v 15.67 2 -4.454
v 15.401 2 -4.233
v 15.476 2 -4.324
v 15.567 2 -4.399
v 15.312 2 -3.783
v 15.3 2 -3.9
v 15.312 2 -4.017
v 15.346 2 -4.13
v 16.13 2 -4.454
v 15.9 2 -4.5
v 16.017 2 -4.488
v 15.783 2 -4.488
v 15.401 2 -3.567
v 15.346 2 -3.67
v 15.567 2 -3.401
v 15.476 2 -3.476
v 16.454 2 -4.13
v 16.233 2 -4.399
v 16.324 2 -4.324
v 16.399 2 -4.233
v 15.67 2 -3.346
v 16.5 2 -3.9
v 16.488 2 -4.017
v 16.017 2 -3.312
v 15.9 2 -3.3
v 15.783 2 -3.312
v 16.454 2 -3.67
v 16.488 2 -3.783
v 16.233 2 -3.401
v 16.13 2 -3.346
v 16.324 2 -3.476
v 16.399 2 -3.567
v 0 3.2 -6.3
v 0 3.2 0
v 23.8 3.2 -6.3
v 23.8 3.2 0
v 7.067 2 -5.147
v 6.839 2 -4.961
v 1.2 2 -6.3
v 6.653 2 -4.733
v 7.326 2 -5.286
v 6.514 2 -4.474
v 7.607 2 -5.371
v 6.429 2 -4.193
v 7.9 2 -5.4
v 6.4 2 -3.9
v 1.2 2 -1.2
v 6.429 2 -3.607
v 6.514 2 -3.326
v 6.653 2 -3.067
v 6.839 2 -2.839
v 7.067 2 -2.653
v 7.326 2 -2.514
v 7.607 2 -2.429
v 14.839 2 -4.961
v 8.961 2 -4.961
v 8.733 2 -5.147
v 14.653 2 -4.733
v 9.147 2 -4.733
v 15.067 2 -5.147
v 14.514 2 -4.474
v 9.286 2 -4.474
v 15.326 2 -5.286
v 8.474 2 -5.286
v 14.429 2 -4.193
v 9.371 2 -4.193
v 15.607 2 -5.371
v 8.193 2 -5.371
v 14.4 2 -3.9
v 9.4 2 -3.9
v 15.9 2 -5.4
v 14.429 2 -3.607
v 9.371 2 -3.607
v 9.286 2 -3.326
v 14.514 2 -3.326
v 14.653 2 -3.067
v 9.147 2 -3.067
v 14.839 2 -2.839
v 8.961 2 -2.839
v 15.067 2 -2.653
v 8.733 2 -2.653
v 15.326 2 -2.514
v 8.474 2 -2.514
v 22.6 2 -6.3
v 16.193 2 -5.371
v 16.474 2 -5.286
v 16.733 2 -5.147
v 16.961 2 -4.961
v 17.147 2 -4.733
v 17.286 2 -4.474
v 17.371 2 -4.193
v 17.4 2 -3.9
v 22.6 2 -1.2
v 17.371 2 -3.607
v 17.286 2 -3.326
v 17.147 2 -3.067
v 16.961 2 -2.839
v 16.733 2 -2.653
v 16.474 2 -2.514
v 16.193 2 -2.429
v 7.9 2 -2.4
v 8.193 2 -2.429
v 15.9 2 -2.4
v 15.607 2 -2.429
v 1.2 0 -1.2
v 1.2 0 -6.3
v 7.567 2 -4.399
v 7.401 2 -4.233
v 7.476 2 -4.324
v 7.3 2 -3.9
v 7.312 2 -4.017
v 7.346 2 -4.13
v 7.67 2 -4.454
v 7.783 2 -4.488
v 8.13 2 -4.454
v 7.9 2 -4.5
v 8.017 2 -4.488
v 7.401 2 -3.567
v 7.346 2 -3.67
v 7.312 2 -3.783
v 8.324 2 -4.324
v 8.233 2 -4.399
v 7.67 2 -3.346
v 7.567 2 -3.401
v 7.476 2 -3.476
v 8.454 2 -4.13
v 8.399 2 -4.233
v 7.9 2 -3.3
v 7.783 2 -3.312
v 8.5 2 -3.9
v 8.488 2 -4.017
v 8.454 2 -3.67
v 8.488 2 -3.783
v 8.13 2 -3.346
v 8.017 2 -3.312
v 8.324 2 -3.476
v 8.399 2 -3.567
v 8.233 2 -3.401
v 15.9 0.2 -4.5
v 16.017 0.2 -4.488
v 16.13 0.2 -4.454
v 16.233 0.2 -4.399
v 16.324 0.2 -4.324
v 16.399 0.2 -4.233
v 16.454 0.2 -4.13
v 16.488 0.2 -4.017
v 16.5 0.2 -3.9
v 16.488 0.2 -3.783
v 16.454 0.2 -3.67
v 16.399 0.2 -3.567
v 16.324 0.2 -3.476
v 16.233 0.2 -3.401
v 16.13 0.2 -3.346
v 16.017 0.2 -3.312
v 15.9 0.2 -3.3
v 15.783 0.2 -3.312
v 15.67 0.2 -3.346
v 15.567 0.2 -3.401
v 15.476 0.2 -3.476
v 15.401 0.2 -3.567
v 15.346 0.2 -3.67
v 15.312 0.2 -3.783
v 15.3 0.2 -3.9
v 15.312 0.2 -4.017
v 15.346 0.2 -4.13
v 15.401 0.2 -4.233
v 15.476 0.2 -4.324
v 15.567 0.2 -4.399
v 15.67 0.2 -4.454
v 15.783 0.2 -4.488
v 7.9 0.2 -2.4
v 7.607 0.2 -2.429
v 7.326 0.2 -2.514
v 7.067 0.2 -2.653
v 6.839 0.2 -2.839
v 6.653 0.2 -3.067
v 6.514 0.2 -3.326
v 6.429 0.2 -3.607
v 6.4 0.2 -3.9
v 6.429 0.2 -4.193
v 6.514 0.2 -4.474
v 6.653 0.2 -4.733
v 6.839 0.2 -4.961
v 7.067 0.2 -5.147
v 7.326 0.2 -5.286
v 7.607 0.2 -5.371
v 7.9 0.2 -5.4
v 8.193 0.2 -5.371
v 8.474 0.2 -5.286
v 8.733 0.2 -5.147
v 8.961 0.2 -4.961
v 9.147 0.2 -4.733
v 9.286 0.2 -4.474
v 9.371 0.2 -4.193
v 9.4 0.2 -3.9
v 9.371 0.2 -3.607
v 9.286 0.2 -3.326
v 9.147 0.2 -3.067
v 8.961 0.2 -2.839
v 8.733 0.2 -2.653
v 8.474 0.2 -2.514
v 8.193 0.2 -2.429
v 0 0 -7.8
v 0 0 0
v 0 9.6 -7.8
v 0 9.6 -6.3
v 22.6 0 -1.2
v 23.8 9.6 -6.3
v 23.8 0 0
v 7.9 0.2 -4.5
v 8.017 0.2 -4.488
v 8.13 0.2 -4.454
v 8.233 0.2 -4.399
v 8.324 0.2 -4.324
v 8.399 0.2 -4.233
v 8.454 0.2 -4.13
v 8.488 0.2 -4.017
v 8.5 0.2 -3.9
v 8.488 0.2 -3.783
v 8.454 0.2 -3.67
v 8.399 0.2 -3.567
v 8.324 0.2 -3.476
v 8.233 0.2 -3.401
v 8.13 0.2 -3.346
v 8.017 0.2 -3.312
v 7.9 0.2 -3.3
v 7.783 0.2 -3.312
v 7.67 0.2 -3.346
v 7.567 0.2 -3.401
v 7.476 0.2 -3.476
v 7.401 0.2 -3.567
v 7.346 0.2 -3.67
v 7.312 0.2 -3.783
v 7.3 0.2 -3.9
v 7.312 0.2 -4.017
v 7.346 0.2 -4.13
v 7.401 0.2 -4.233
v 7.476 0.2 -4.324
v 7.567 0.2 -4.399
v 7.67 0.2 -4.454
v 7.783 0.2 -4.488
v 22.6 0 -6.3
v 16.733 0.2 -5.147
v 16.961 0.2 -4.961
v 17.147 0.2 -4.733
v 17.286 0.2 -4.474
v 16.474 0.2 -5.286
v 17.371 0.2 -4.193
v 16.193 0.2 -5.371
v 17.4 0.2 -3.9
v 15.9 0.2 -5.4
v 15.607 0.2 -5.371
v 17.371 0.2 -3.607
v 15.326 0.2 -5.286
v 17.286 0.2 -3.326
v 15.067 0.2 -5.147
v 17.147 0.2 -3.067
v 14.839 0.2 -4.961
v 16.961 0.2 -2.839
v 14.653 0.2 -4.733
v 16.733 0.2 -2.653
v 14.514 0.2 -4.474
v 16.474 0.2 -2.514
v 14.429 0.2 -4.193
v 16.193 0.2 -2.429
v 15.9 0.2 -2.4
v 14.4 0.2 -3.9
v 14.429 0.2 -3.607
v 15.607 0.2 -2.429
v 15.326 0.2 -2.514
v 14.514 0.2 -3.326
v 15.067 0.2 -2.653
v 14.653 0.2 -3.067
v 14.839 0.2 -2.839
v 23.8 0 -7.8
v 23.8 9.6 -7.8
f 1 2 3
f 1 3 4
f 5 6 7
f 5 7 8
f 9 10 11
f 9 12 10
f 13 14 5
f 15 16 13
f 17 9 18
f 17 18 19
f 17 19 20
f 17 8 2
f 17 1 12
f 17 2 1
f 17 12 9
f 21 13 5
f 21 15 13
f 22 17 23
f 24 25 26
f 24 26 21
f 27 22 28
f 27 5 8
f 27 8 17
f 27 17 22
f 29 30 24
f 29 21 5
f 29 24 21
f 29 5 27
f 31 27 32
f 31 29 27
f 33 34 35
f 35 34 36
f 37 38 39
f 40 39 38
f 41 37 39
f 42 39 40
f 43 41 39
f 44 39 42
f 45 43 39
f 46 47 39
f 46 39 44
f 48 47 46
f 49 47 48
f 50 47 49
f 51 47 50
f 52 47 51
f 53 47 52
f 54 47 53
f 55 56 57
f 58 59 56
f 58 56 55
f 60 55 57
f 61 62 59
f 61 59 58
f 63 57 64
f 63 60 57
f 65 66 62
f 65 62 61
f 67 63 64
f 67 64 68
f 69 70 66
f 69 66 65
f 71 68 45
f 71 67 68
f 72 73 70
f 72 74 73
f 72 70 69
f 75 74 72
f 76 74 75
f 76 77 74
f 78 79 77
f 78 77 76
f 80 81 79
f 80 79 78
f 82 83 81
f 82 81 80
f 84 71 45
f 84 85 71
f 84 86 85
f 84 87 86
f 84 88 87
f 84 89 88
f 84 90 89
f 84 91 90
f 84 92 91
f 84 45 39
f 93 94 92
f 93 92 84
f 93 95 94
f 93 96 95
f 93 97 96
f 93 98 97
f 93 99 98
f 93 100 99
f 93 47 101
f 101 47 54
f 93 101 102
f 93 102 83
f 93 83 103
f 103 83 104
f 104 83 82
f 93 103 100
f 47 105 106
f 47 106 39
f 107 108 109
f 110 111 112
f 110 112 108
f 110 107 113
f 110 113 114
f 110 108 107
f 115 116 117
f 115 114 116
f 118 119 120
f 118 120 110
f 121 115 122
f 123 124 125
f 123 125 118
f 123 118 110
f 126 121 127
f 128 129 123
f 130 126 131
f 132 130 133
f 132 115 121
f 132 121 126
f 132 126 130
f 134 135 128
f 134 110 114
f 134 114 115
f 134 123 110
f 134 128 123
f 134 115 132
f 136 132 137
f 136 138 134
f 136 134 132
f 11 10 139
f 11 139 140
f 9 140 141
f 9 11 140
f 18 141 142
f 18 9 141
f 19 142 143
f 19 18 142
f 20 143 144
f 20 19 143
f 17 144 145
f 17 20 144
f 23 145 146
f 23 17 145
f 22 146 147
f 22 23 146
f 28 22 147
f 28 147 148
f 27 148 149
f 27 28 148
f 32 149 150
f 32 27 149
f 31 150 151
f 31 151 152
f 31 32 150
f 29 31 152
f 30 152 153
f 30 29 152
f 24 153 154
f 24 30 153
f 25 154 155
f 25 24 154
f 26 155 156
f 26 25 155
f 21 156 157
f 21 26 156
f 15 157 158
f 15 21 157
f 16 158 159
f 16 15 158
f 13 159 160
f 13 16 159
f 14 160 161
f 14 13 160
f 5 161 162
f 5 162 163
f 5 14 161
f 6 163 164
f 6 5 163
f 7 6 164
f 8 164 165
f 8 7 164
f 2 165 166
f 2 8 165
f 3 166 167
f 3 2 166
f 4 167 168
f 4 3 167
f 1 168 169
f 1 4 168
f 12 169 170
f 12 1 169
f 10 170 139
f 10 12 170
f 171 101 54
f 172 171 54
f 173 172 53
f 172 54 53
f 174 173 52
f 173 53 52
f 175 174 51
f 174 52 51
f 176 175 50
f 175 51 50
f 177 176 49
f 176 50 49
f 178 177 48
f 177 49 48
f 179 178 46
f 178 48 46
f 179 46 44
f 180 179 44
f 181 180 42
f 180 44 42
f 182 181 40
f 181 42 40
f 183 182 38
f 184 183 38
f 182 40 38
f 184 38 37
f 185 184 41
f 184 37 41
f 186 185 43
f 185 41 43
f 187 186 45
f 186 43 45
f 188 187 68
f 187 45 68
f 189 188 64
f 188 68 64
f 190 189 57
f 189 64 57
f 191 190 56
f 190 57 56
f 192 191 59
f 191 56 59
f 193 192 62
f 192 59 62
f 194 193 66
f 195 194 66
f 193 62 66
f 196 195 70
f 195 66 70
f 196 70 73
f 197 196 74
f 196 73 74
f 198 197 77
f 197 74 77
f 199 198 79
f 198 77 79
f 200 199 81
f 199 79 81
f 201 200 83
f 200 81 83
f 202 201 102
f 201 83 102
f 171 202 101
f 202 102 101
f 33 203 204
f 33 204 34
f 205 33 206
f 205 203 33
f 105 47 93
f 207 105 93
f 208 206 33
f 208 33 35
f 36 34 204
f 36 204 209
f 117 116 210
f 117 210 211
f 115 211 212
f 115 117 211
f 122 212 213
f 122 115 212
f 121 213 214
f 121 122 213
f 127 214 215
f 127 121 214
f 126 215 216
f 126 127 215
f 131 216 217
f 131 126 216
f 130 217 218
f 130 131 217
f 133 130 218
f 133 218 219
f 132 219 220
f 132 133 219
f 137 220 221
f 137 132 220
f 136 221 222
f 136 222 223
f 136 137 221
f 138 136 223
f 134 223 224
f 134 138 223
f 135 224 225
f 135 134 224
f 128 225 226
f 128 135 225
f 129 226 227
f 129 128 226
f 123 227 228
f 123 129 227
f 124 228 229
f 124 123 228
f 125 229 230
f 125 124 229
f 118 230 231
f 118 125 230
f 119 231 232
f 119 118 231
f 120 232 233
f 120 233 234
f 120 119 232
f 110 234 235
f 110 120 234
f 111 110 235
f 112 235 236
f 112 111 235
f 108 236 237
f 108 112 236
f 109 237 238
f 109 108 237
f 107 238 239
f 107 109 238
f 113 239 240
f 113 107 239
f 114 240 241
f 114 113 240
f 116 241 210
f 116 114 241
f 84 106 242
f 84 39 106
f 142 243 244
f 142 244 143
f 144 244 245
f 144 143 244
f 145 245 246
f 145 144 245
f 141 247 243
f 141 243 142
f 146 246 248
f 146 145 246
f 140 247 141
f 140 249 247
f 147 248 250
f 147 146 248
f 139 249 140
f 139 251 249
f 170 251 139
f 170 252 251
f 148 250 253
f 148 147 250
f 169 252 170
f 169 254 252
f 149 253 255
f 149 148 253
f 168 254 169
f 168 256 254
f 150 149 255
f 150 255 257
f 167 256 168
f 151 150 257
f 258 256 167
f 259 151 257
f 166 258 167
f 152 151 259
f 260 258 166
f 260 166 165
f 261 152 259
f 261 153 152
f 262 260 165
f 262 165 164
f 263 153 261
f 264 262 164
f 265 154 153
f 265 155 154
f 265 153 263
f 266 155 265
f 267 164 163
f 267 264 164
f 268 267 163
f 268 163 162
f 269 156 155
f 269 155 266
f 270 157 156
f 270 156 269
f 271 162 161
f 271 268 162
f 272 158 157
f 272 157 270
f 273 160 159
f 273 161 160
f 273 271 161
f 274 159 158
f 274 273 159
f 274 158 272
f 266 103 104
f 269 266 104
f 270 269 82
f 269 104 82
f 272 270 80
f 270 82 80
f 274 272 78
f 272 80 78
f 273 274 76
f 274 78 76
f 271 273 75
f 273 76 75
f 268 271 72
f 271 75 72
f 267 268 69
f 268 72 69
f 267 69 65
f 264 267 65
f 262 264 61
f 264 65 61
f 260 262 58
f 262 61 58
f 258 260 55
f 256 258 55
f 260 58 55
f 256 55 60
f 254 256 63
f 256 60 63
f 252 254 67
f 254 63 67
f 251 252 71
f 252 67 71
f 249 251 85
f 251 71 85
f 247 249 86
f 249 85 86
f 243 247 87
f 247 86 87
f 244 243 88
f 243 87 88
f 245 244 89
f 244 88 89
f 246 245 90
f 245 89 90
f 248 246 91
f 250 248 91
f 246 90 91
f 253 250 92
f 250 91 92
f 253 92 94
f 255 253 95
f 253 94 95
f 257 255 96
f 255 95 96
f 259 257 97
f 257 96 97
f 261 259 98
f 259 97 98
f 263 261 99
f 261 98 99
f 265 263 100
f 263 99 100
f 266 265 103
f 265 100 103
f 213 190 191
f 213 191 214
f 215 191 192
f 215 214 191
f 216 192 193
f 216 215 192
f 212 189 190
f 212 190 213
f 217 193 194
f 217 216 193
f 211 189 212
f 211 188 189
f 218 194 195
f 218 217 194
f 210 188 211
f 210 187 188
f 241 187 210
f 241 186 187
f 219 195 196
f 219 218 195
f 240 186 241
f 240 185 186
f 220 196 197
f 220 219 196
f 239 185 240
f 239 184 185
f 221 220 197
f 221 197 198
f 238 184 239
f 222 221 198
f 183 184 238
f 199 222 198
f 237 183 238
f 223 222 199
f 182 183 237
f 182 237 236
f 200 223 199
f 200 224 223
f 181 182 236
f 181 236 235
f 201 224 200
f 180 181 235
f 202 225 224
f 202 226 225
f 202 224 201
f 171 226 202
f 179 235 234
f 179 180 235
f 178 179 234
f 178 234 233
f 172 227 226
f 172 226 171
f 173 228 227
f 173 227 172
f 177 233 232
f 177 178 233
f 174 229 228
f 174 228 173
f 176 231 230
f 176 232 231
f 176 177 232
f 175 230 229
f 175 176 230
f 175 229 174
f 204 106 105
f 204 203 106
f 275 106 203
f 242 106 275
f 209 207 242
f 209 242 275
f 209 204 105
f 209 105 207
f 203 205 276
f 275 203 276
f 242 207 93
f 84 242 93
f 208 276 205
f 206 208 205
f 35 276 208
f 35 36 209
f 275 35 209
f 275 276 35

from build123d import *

# Parameters (mm, degrees)
SKETCH1_W           = 23.8
SKETCH1_H           = 3.2
BOSS_EXTRUDE1_DEPTH = 7.8
SHELL1_T            = -1.2
SKETCH3_R           = 1.5
SKETCH3_R_2         = 0.6
BOSS_EXTRUDE3_DEPTH = 1.8
LPATTERN1_COUNT     = 2
LPATTERN1_PITCH     = 8
BOSS_EXTRUDE4_DEPTH = 1.5


with BuildPart() as part:
    # Sketch1 → Boss-Extrude1 (new body)
    with BuildSketch(Plane.XY):
        with Locations((11.9, 1.6)):
            Rectangle(SKETCH1_W, SKETCH1_H)
    extrude(amount=-BOSS_EXTRUDE1_DEPTH)

    # Shell1
    shell1_openings = [part.faces().sort_by_distance(p)[0] for p in [
        (11.9, 0, -3.9),
    ]]
    offset(amount=SHELL1_T, openings=shell1_openings, kind=Kind.INTERSECTION)

    # Sketch3 → Boss-Extrude3 (add)
    with BuildSketch(Plane.XZ.offset(-2)):
        with Locations(Location((15.9, -3.9, 0), (0, 0, 90))):
            Circle(SKETCH3_R)
        with Locations(Location((15.9, -3.9, 0), (0, 0, 270))):
            Circle(SKETCH3_R_2, mode=Mode.SUBTRACT)
    boss_extrude3 = extrude(amount=BOSS_EXTRUDE3_DEPTH)

    # LPattern1: Boss-Extrude3 ×2
    with Locations(*[(-i * LPATTERN1_PITCH, 0, 0) for i in range(1, LPATTERN1_COUNT)]):
        add(boss_extrude3)

    # Sketch4 → Boss-Extrude4 (add)
    with BuildSketch(Plane(origin=(0, 0, -7.8), x_dir=(-1, 0, 0), z_dir=(0, 0, -1))):
        Polygon((-23.8, 3.2), (-23.8, 9.6), (0, 9.6), (0, 3.2), (0, 0), (-23.8, 0), align=None)
    extrude(amount=-BOSS_EXTRUDE4_DEPTH)


solid = part.part
